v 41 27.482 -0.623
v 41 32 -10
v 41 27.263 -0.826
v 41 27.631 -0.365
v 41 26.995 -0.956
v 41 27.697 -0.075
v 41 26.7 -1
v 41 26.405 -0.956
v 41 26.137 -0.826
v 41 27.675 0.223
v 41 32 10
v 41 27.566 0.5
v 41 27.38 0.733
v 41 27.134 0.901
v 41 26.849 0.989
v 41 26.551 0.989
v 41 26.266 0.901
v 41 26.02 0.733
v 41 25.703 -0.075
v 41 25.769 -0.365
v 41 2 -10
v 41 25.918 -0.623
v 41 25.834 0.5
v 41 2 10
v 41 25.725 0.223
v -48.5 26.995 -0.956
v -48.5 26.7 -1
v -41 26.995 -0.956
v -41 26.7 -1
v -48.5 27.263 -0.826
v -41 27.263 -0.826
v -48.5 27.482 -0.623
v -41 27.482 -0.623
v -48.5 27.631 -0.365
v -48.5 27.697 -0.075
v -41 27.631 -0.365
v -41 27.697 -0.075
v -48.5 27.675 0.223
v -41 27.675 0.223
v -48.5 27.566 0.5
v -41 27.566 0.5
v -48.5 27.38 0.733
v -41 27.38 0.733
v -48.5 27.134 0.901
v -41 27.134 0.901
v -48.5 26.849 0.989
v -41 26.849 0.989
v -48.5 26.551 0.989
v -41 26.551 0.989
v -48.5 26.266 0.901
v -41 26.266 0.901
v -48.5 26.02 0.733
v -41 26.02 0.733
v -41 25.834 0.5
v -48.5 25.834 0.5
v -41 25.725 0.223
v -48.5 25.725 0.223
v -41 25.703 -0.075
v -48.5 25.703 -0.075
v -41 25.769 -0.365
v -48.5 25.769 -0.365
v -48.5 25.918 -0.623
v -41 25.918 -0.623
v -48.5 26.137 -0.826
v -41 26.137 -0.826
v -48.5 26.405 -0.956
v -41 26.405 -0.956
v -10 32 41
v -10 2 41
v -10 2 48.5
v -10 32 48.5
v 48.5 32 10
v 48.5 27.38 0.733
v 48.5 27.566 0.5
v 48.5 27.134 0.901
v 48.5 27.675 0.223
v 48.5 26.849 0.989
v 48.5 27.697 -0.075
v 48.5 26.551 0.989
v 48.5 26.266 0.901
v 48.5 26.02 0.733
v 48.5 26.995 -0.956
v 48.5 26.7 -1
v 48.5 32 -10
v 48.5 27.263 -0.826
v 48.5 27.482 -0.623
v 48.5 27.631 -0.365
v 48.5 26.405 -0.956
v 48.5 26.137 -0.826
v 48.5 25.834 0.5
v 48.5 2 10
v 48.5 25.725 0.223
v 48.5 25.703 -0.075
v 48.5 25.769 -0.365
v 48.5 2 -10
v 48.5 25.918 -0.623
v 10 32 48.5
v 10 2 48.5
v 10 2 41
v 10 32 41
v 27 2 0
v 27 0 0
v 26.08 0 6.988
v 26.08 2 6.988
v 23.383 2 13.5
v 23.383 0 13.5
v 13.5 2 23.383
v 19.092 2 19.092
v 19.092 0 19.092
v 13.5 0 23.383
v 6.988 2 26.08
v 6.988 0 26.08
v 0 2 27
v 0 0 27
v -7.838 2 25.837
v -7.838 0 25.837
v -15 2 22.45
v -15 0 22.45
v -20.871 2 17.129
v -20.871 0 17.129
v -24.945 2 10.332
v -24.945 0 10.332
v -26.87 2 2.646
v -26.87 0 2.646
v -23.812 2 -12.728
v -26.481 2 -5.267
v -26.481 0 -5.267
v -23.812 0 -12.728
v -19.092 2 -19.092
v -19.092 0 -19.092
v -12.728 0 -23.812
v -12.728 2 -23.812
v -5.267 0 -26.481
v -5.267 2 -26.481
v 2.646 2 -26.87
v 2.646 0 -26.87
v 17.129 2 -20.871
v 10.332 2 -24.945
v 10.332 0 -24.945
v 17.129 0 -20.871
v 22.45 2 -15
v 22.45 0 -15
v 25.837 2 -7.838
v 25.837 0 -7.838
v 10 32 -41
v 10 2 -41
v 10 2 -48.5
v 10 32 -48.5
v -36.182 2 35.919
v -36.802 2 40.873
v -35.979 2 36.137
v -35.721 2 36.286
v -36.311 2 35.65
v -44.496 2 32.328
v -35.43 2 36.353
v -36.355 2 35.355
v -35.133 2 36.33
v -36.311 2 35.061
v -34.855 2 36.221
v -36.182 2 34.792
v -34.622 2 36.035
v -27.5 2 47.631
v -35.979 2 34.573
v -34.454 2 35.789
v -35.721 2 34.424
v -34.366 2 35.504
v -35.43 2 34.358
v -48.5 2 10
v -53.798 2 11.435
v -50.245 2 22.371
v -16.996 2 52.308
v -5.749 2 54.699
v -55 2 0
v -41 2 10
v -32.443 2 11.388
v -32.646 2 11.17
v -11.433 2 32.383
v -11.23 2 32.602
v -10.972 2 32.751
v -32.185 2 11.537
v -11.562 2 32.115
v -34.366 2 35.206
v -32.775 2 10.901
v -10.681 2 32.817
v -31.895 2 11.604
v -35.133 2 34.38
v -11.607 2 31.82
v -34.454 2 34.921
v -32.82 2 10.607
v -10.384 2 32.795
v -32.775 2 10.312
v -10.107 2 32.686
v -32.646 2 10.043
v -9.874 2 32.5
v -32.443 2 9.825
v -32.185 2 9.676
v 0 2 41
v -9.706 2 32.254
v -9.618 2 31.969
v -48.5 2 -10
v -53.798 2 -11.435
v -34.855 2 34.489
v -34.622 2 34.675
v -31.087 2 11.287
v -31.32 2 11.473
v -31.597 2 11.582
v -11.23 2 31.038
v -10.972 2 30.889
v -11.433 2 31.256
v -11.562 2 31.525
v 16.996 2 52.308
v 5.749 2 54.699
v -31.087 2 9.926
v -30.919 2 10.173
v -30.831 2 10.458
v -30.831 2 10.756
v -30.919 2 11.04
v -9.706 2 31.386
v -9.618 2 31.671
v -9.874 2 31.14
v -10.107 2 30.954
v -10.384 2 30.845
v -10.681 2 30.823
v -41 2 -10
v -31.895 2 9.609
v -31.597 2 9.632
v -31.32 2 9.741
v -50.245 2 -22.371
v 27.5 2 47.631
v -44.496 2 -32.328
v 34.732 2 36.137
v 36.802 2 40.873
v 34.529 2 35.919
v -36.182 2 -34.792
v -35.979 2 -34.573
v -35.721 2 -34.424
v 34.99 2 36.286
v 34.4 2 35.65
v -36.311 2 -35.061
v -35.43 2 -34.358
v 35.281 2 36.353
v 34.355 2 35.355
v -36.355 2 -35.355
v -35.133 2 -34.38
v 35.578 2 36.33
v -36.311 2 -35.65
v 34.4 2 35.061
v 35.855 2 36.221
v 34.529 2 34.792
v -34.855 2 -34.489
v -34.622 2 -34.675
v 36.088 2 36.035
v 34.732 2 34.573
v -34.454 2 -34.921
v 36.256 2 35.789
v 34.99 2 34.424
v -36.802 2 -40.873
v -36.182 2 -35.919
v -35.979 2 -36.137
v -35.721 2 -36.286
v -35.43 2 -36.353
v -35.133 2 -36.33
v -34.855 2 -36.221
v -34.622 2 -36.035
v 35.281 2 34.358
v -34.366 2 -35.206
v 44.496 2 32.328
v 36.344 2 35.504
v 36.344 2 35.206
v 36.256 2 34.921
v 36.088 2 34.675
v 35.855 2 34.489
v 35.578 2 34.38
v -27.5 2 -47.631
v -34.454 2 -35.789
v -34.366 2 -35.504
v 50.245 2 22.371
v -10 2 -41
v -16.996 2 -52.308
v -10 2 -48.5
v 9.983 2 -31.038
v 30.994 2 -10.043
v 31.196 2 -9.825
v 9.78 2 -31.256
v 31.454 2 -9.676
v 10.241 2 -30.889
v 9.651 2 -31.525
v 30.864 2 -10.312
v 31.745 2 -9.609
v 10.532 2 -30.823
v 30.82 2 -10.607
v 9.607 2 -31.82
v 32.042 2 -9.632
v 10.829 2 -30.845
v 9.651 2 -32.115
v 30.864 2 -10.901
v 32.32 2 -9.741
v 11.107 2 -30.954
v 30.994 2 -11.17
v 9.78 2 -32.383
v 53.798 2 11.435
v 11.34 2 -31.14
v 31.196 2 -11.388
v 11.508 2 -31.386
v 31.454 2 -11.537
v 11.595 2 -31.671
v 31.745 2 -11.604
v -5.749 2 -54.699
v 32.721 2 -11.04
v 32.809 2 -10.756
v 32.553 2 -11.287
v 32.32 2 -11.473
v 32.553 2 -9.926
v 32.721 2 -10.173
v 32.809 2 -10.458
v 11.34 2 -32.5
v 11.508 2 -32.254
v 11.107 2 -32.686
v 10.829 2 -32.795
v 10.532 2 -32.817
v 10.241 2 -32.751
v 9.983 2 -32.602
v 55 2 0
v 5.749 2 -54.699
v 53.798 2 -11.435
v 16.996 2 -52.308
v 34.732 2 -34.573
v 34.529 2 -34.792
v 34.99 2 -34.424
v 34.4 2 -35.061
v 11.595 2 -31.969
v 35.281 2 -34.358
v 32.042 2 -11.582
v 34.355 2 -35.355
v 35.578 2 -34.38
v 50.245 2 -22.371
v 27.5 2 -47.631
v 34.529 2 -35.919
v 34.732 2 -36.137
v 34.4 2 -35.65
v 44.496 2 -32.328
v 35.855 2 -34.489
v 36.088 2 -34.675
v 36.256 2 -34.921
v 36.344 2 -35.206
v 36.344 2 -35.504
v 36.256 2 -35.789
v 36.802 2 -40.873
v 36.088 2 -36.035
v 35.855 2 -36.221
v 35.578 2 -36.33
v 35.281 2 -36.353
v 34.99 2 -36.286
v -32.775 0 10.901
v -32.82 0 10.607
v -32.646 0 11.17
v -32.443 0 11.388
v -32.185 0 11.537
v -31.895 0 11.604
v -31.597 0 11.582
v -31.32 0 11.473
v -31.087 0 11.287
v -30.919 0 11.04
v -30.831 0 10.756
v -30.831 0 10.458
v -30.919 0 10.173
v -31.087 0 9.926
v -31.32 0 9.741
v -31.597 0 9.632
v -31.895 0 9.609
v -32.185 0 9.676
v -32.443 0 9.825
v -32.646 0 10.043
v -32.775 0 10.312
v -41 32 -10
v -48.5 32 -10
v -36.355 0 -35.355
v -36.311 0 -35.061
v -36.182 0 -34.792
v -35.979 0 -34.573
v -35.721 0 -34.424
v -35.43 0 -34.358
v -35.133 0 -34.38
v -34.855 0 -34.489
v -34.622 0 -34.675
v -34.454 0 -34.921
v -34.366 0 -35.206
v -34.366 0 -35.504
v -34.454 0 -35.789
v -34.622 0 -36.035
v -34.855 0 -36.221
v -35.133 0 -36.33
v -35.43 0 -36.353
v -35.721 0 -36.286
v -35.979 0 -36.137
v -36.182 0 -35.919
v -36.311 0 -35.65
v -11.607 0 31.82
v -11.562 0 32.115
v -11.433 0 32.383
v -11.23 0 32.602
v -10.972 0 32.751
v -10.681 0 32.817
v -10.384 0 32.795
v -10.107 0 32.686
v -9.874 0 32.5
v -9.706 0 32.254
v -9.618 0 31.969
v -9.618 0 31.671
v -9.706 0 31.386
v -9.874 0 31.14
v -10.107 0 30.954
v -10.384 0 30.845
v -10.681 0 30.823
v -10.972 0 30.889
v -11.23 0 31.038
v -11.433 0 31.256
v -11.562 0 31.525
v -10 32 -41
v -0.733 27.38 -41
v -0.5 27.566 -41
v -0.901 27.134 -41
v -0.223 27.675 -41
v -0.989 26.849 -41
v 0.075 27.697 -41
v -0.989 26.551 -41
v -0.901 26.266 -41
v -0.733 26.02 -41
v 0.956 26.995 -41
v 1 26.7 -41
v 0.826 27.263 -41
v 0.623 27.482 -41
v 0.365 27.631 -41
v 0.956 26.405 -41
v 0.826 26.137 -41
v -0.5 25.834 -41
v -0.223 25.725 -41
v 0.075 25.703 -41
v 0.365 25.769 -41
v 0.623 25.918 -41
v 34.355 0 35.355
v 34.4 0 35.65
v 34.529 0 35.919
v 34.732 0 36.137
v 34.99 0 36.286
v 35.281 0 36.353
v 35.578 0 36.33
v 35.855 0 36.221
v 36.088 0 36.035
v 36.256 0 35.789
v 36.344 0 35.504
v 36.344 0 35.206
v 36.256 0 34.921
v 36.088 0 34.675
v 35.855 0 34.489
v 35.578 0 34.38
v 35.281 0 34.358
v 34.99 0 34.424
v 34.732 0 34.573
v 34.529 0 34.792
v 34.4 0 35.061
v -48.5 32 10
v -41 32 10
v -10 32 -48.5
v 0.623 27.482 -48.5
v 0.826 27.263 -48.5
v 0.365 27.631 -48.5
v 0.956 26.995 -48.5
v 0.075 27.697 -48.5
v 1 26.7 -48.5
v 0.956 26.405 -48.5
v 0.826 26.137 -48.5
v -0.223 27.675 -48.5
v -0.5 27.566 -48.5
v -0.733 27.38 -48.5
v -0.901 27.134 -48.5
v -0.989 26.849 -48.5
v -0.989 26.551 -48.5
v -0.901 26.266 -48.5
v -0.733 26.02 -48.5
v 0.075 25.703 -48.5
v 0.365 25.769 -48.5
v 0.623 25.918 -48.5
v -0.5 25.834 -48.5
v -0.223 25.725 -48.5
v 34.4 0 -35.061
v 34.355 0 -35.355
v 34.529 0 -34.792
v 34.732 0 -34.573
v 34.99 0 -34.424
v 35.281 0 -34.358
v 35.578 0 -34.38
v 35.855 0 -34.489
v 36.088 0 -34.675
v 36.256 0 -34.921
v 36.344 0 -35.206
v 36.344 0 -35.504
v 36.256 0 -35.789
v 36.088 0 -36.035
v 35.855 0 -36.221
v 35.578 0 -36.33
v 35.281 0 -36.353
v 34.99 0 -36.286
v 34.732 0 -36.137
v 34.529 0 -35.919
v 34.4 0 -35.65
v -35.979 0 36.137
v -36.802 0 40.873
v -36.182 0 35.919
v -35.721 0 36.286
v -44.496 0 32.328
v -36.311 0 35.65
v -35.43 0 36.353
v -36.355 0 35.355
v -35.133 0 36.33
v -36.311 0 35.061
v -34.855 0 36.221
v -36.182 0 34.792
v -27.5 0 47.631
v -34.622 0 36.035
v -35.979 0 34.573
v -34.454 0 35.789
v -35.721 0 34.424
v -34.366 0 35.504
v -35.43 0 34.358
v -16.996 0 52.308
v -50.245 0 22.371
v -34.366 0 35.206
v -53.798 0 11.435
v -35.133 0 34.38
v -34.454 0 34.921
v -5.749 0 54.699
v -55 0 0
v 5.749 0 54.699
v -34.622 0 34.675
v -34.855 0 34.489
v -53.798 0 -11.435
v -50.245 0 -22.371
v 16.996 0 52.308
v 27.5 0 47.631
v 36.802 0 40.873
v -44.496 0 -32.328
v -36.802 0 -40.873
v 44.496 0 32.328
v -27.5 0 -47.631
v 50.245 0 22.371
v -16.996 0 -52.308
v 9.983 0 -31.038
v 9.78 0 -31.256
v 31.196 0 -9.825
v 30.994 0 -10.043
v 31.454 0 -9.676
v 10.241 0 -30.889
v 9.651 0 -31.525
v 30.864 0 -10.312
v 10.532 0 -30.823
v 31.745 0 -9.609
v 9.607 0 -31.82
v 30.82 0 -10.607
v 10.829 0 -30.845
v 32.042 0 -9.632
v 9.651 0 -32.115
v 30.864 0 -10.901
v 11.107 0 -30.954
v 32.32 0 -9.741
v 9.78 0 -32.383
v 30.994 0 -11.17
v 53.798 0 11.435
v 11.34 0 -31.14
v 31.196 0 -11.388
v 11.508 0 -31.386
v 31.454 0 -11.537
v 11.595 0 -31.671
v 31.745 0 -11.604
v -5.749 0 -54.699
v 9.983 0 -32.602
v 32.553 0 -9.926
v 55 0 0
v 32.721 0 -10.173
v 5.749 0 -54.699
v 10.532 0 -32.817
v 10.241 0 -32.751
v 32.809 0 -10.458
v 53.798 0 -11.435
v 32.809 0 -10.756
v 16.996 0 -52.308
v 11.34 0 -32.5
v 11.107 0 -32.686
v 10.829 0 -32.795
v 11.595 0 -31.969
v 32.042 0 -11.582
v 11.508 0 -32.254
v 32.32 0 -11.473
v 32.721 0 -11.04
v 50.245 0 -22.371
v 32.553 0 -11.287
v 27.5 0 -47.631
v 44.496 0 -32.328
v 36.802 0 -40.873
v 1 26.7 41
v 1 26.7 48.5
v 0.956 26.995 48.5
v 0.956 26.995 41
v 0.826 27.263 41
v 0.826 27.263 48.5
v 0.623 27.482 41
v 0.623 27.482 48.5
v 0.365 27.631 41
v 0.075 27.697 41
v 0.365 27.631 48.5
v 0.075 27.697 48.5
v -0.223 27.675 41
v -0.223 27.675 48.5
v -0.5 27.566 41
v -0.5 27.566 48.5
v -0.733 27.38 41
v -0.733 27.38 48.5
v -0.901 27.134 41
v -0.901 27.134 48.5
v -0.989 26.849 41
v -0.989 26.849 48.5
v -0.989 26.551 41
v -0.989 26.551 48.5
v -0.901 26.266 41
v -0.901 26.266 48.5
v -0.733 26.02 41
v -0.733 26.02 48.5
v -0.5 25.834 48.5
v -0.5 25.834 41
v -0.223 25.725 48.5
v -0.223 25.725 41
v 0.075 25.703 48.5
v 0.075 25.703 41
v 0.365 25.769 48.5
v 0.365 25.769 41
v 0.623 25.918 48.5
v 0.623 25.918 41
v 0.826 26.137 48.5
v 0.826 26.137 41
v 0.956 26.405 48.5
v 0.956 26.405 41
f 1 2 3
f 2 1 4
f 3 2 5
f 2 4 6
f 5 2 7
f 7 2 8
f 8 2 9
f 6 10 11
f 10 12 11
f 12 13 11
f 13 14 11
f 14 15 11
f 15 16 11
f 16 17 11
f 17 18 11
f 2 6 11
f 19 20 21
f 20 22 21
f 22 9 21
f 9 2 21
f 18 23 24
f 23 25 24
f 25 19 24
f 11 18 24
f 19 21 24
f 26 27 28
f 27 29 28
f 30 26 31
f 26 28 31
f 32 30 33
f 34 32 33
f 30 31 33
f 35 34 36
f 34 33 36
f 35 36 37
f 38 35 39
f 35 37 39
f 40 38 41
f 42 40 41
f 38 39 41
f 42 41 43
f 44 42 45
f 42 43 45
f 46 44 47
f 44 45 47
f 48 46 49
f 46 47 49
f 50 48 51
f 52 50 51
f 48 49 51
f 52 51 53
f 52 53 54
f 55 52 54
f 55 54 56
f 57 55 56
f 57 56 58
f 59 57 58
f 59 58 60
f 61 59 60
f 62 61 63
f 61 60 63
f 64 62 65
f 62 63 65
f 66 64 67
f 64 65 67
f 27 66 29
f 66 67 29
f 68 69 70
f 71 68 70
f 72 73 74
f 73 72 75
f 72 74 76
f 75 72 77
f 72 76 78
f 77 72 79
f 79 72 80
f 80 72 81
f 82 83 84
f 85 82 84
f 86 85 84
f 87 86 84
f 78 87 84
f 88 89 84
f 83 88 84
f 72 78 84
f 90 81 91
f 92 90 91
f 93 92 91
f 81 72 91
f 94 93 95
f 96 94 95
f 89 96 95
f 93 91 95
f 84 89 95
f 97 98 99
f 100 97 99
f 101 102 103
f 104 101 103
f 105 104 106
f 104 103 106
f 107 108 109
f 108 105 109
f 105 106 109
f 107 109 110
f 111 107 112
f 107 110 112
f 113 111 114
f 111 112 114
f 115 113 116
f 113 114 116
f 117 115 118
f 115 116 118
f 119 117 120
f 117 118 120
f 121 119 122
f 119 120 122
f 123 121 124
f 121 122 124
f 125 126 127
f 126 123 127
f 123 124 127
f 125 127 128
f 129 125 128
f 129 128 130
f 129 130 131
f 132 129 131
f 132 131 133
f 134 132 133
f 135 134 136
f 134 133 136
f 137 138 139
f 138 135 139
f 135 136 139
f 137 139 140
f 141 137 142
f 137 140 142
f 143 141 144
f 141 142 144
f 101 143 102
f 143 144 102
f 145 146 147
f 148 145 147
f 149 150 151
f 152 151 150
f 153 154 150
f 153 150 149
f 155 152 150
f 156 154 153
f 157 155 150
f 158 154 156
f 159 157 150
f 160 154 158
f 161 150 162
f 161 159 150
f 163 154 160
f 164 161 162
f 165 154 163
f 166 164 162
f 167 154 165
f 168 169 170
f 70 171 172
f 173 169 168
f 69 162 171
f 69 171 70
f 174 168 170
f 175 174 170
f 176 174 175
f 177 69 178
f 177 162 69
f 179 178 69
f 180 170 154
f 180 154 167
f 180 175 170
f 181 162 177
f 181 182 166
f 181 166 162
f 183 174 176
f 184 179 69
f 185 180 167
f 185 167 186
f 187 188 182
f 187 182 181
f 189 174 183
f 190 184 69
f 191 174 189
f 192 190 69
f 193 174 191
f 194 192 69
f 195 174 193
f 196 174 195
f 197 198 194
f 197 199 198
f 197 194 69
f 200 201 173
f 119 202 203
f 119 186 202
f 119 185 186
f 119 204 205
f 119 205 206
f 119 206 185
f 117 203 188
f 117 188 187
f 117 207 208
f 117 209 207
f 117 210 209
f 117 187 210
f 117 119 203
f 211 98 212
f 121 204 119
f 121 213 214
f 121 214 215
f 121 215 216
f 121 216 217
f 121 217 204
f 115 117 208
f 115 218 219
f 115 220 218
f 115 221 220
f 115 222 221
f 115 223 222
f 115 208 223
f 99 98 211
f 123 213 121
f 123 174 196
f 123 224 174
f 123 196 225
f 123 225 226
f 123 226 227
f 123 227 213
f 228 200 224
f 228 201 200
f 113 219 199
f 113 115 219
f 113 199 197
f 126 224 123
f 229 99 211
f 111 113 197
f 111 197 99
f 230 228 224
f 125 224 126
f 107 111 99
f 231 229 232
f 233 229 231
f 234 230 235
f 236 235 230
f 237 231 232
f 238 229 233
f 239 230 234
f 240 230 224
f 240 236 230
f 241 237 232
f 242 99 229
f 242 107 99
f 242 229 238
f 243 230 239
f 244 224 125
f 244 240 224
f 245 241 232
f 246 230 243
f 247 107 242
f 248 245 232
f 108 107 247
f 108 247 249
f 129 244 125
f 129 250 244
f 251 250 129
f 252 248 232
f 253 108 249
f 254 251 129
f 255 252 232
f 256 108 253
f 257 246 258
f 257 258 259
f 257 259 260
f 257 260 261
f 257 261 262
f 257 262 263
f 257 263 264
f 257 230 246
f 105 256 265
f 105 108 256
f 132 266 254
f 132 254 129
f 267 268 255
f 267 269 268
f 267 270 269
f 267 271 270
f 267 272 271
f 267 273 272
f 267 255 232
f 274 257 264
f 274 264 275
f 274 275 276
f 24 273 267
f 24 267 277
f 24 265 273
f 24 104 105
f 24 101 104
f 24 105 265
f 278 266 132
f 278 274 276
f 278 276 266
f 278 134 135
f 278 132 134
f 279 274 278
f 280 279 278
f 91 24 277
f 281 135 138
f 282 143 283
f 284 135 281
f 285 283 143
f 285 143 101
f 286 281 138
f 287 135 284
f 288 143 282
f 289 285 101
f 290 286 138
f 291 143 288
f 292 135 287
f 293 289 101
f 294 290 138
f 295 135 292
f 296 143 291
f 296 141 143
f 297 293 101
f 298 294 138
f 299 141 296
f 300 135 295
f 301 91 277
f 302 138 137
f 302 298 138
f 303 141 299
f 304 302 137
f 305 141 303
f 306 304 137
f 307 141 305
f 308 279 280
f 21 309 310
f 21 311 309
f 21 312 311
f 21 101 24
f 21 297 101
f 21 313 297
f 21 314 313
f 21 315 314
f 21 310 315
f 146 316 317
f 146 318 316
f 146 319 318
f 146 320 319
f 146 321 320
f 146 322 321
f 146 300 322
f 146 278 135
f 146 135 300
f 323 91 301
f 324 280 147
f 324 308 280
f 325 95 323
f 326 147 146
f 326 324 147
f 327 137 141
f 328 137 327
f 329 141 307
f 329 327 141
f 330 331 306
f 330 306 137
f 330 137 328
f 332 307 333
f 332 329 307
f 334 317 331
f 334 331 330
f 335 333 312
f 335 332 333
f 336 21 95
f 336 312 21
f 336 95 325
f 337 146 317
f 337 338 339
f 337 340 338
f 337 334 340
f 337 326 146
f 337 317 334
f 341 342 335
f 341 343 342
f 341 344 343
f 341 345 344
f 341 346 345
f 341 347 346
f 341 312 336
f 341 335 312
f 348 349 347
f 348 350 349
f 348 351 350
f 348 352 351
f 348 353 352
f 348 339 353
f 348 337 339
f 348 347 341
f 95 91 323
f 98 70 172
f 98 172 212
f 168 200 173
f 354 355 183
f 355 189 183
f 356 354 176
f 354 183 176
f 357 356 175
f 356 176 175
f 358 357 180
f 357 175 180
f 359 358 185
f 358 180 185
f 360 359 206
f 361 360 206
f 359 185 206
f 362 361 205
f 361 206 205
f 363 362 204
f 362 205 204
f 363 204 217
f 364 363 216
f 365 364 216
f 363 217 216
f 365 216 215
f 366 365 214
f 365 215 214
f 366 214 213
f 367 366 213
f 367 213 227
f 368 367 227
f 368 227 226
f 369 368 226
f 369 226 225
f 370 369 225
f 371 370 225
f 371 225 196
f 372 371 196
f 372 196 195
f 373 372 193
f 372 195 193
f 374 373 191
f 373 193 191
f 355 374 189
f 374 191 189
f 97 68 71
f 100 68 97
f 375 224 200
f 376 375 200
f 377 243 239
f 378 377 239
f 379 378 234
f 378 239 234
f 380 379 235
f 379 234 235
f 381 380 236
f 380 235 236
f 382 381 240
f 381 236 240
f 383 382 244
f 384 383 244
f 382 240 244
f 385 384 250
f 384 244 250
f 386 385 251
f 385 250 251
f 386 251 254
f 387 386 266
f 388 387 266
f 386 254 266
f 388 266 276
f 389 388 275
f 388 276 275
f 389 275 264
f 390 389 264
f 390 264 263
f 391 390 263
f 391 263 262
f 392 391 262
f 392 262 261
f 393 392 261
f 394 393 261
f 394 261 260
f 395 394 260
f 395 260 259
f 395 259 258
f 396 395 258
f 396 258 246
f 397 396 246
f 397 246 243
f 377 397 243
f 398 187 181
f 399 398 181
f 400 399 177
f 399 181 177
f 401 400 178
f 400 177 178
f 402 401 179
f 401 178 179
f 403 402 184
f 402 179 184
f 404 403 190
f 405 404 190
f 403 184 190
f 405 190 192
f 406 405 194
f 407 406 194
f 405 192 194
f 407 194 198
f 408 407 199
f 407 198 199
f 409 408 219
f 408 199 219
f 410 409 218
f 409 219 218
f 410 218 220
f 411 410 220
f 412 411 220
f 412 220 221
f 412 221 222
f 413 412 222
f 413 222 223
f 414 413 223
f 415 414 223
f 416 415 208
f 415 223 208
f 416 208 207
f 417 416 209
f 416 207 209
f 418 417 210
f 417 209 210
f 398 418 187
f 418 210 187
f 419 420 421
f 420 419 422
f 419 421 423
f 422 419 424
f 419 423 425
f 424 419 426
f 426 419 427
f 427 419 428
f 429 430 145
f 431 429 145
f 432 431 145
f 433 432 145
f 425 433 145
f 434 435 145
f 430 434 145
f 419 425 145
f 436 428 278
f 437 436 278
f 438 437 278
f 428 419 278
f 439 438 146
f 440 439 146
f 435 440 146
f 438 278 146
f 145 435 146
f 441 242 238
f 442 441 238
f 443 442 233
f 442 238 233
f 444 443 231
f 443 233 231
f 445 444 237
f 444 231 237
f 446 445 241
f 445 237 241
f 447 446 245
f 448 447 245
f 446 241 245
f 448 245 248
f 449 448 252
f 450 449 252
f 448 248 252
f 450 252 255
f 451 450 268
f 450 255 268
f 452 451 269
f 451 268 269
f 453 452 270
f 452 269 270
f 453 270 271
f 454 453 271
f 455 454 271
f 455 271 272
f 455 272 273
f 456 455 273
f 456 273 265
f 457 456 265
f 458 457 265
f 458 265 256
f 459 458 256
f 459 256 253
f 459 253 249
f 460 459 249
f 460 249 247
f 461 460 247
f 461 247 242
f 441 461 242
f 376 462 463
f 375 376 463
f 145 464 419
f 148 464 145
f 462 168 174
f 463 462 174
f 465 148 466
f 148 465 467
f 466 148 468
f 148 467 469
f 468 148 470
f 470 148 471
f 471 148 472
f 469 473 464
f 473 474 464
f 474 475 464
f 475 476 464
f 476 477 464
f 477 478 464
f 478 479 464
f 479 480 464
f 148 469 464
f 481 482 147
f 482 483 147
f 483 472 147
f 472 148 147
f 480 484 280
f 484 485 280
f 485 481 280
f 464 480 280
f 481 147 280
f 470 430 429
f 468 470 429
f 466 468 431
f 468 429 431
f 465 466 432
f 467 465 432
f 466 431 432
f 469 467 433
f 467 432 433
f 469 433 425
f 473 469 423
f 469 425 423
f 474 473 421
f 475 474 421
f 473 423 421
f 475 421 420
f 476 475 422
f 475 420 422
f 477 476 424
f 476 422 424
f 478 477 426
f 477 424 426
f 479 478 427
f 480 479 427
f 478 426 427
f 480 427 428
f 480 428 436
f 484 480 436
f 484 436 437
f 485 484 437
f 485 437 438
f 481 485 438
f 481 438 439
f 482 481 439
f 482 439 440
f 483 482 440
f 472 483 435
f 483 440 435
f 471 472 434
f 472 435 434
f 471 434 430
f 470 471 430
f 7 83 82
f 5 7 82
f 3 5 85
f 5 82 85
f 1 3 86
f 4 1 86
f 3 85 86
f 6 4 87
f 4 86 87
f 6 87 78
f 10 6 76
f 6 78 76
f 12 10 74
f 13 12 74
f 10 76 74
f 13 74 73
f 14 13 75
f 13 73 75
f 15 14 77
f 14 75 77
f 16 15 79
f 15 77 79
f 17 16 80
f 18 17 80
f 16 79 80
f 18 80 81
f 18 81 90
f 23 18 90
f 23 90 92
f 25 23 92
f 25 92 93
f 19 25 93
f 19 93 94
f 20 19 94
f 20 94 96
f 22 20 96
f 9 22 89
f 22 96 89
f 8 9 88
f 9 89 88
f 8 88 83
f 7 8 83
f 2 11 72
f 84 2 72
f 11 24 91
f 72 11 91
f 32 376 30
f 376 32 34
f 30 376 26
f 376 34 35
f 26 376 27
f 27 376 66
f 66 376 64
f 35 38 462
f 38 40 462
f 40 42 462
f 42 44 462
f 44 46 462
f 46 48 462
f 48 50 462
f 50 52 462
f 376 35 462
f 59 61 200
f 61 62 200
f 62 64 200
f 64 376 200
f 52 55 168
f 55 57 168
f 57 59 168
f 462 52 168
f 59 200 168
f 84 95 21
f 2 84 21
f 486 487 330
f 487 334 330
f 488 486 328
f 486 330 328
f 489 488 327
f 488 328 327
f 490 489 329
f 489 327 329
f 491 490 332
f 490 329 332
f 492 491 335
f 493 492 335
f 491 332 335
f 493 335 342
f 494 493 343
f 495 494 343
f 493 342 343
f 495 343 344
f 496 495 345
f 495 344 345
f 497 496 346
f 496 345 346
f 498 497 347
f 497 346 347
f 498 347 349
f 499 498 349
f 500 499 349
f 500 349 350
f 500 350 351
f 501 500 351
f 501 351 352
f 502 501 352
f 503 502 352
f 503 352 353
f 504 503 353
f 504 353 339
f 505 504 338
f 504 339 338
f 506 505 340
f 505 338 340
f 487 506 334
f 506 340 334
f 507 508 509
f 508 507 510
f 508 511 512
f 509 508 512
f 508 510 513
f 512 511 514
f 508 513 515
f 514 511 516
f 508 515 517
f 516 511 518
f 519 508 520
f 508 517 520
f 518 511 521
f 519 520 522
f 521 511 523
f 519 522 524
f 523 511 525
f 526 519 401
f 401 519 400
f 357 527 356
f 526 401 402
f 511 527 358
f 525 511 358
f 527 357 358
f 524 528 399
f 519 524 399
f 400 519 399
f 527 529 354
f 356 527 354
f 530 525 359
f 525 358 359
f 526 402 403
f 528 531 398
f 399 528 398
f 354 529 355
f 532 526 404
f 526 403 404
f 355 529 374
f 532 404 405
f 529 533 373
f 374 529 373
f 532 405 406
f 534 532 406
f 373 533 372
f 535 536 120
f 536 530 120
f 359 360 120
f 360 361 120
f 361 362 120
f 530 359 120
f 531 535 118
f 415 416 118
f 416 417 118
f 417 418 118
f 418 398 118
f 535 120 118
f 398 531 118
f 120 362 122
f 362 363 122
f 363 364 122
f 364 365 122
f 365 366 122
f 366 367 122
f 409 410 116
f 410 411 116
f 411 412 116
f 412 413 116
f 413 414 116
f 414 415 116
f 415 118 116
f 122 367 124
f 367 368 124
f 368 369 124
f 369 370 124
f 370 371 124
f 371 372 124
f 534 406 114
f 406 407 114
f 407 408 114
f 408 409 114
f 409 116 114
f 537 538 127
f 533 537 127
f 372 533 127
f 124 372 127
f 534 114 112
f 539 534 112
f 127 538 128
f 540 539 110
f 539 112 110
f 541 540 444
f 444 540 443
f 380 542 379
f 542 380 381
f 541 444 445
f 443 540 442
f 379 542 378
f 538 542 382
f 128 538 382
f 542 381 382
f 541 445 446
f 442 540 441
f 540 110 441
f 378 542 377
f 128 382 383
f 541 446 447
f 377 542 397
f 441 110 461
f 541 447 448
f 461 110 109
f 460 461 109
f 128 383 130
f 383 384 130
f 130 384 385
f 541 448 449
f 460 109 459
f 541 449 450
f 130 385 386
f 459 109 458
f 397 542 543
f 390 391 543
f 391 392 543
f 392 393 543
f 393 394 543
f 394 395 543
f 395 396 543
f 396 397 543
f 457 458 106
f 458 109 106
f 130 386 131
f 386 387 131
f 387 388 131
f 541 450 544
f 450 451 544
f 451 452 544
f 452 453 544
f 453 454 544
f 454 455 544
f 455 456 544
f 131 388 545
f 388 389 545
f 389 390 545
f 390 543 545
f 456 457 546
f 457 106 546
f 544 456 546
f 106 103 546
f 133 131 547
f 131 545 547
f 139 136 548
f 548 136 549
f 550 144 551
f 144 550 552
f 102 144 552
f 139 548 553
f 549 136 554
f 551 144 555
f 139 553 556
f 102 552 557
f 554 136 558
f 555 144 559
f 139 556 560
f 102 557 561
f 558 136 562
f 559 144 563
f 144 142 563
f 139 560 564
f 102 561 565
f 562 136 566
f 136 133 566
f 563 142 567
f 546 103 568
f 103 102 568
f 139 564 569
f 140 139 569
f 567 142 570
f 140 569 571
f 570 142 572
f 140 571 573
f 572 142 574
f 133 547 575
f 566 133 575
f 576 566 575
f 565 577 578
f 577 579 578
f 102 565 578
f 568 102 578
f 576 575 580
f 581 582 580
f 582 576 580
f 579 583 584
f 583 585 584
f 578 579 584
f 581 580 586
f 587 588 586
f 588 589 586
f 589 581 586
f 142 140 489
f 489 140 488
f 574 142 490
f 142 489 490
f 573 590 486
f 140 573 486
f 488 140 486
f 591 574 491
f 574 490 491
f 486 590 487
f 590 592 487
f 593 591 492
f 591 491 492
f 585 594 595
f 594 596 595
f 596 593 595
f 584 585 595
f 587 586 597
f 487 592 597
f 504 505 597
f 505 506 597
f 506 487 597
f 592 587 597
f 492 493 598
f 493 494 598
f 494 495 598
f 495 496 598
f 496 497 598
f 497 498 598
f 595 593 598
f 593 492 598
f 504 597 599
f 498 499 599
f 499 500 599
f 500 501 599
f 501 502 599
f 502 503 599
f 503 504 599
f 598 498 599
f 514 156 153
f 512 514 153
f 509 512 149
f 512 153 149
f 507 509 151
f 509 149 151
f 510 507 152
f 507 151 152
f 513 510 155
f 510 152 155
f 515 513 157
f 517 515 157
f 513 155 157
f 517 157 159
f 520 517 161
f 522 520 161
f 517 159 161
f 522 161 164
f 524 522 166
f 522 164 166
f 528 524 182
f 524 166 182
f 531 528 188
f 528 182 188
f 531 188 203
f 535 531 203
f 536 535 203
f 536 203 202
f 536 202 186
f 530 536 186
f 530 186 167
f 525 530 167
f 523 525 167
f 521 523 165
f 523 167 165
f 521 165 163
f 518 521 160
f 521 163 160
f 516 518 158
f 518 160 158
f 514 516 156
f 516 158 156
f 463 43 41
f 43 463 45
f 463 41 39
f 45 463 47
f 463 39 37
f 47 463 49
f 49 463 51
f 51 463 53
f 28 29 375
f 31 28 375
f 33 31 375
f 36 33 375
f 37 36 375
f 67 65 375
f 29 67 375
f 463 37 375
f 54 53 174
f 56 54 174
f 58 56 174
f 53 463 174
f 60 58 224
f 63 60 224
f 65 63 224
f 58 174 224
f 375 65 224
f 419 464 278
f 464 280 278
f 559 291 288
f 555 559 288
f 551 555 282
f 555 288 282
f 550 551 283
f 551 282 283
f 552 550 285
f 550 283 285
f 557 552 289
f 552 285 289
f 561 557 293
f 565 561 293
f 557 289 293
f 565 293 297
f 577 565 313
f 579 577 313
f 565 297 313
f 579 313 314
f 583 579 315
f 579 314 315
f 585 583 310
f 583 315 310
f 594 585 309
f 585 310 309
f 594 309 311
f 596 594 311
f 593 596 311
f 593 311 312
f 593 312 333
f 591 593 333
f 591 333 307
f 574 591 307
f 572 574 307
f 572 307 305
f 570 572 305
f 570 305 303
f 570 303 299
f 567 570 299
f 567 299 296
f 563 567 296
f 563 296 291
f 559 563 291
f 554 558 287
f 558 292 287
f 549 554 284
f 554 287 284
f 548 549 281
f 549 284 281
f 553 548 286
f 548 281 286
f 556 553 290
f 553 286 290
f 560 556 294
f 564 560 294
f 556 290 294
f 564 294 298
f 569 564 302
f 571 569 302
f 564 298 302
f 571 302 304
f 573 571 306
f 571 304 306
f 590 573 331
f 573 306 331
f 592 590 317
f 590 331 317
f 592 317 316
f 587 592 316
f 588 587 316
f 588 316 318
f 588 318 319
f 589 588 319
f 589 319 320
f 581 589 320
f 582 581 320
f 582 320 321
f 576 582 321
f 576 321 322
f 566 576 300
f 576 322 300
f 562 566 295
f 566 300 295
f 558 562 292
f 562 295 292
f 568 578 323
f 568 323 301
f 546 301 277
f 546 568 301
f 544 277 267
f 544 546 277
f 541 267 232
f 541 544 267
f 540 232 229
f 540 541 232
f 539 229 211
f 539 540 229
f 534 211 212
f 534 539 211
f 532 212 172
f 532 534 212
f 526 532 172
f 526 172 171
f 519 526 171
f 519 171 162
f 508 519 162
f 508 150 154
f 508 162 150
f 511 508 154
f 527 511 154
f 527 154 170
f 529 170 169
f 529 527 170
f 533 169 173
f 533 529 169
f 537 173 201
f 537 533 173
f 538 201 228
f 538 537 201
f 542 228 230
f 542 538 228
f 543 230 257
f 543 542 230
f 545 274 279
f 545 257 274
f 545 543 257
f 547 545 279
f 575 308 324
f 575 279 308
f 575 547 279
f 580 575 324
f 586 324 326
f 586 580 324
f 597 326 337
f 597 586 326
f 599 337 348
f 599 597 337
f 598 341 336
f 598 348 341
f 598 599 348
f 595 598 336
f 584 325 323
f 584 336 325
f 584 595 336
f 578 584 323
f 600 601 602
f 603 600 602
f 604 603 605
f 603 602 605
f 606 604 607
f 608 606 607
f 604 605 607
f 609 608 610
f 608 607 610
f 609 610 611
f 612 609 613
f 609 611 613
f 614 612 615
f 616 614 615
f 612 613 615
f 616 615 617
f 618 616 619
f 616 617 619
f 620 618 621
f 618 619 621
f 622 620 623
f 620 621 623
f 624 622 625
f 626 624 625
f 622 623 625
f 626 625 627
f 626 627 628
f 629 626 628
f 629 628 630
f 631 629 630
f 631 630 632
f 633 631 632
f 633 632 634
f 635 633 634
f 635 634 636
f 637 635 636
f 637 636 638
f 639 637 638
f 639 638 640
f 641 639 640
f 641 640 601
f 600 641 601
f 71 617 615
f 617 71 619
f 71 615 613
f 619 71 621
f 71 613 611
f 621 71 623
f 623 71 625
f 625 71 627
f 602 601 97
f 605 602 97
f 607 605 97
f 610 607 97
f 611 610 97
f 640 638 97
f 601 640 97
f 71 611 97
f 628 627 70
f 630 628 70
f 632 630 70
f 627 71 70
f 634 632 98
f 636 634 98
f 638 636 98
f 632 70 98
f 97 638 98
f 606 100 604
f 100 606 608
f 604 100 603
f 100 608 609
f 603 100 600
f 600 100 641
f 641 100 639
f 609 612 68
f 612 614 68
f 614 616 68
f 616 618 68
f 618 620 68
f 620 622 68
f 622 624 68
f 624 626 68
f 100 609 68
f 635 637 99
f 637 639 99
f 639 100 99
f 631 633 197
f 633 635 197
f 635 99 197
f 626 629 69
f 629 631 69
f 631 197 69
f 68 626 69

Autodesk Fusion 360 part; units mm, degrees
sketch "Sketch1" plane through (0, 0, 0) normal (0, 1, 0) x (1, 0, 0)
  circle A0 centre (0, 0) radius 27
  circle A1 centre (0, 0) radius 55
  line L0 (10, -41) -> (-10, -41)
  line L1 (-10, -41) -> (-10, -48.5)
  line L2 (-10, -48.5) -> (10, -48.5)
  line L3 (10, -48.5) -> (10, -41)
  line L4 (10, -41) -> (-10, -48.5) construction
  line L5 (-10, -41) -> (10, -48.5) construction
  line L6 (41, 10) -> (48.5, -10) construction
  line L7 (41, 10) -> (41, -10)
  line L8 (48.5, -10) -> (48.5, 10)
  line L9 (48.5, 10) -> (41, 10)
  line L10 (41, -10) -> (48.5, 10) construction
  line L11 (41, -10) -> (48.5, -10)
  line L12 (-10, 41) -> (10, 48.5) construction
  line L13 (-10, 41) -> (10, 41)
  line L14 (10, 48.5) -> (-10, 48.5)
  line L15 (-10, 48.5) -> (-10, 41)
  line L16 (10, 41) -> (-10, 48.5) construction
  line L17 (10, 41) -> (10, 48.5)
  line L18 (-41, -10) -> (-48.5, 10) construction
  line L19 (-41, -10) -> (-41, 10)
  line L20 (-48.5, 10) -> (-48.5, -10)
  line L21 (-48.5, -10) -> (-41, -10)
  line L22 (-41, 10) -> (-48.5, -10) construction
  line L23 (-41, 10) -> (-48.5, 10)
  line L24 (0, 0) -> (0, -44.75)
  line L25 (0, 0) -> (27, 0)
  point P0 (0, -44.75)
  point P1 (44.75, 0)
  point P2 (0, 44.75)
  point P3 (-44.75, 0)
  dimension "d1" = 54
  dimension "d2" = 110
  dimension "d7" = 7.5
  dimension "d8" = 20
  dimension "d9" = 41
  dimension "d11" = 360
extrude "Extrude3" add sketch "Sketch1" along normal blind 2 contours L0 L1 L2 L3 | A1 | L7 L8 L9 L11 | L13 L14 L15 L17 | L19 L20 L21 L23
extrude "Extrude5" add sketch "Sketch1" along normal blind 32 contours L0 L1 L2 L3 | L7 L8 L9 L11 | L13 L14 L15 L17 | L19 L20 L21 L23
sketch "Sketch6" plane through (0, 2, 0) normal (0, 1, 0) x (-1, 0, 0)
  line L0 (-10, 48.5) -> (10, 48.5)
  line L1 (10, 48.5) -> (10, 41)
  line L2 (10, 41) -> (-10, 41)
  line L3 (-10, 41) -> (-10, 48.5)
  line L4 (41, -10) -> (41, 10)
  line L5 (41, 10) -> (48.5, 10)
  line L6 (48.5, 10) -> (48.5, -10)
  line L7 (48.5, -10) -> (41, -10)
  line L8 (-41, 10) -> (-41, -10)
  line L9 (-41, -10) -> (-48.5, -10)
  line L10 (-48.5, -10) -> (-48.5, 10)
  line L11 (-48.5, 10) -> (-41, 10)
  line L12 (-10, -41) -> (10, -41)
  line L13 (10, -41) -> (10, -48.5)
  line L14 (10, -48.5) -> (-10, -48.5)
  line L15 (-10, -48.5) -> (-10, -41)
  circle A0 centre (0, 0) radius 27
  circle A1 centre (0, 0) radius 55
  line L16 (29.6985, 15.5563) -> (26.8701, 12.7279)
  line L17 (12.7279, 26.8701) -> (15.5563, 29.6985)
  line L18 (18.1297, 22.7228) -> (20.9915, 22.7228) construction
  line L19 (15.3614, 25.1762) -> (18.4198, 25.1762) construction
  line L20 (17.8019, 25.9553) -> (17.4822, 25.9553) construction
  line L21 (29.6985, 15.5563) -> (26.8701, 12.7279)
  line L22 (26.8701, 12.7279) -> (22.6274, 16.9706)
  line L23 (22.6274, 16.9706) -> (25.4558, 19.799)
  line L24 (25.4558, 19.799) -> (29.6985, 15.5563)
  line L25 (15.5563, 29.6985) -> (12.7279, 26.8701)
  line L26 (12.7279, 26.8701) -> (16.9706, 22.6274)
  line L27 (16.9706, 22.6274) -> (19.799, 25.4558)
  line L28 (19.799, 25.4558) -> (15.5563, 29.6985)
  line L29 (22.6274, 16.9706) -> (16.9706, 22.6274)
  line L30 (0, 0) -> (27, 0)
  line L31 (0, 0) -> (19.799, 19.799)
  line L32 (-15.3614, -25.1762) -> (-18.4198, -25.1762) construction
  line L33 (-22.6274, -16.9706) -> (-25.4558, -19.799)
  line L34 (-12.7279, -26.8701) -> (-15.5563, -29.6985)
  line L35 (-26.8701, -12.7279) -> (-22.6274, -16.9706)
  line L36 (-12.7279, -26.8701) -> (-16.9706, -22.6274)
  line L37 (-25.4558, -19.799) -> (-29.6985, -15.5563)
  line L38 (-29.6985, -15.5563) -> (-26.8701, -12.7279)
  line L39 (-18.1297, -22.7228) -> (-20.9915, -22.7228) construction
  line L40 (-29.6985, -15.5563) -> (-26.8701, -12.7279)
  line L41 (-19.799, -25.4558) -> (-15.5563, -29.6985)
  line L42 (-16.9706, -22.6274) -> (-19.799, -25.4558)
  line L43 (-22.6274, -16.9706) -> (-16.9706, -22.6274)
  line L44 (-15.5563, -29.6985) -> (-12.7279, -26.8701)
  line L45 (-17.8019, -25.9553) -> (-17.4822, -25.9553) construction
  circle A2 centre (35.3553, -35.3553) radius 1
  line L46 (35.3553, -35.3553) -> (0, 0)
  circle A3 centre (35.3553, 35.3553) radius 1
  circle A4 centre (-35.3553, 35.3553) radius 1
  circle A5 centre (-35.3553, -35.3553) radius 1
  circle A6 centre (31.8198, 10.6066) radius 1
  line L47 (28.2843, 14.1421) -> (31.8198, 10.6066)
  line L48 (19.799, 19.799) -> (22.225, 22.225)
  circle A7 centre (10.6066, 31.8198) radius 1
  circle A8 centre (-31.8198, -10.6066) radius 1
  circle A9 centre (-10.6066, -31.8198) radius 1
  point P0 (19.799, 19.799)
  point P1 (-19.799, -19.799)
  point P2 (-19.799, -19.799)
  dimension "d37" = 4
  dimension "d38" = 20
  dimension "d43" = 6
  dimension "d44" = 6
  dimension "d45" = 4
  dimension "d46" = 45
  dimension "d48" = 360
  dimension "d61" = 2
  dimension "d62" = 45
  dimension "d63" = 50
  dimension "d65" = 360
  dimension "d68" = 2
  dimension "d69" = 5
  dimension "d71" = 360
  dimension "d74" = 16
  dimension "d75" = 28
extrude "Extrude12" cut sketch "Sketch6" against normal blind 30 contours A6 | A7 | A8 | A9
extrude "Extrude11" cut sketch "Sketch6" against normal blind 10 contours A2 | A3 | A4 | A5
sketch "Sketch8" plane through (0, 0, 48.5) normal (0, 0, 1) x (1, 0, 0)
  line L0 (-10, 2) -> (10, 2)
  line L1 (10, 2) -> (10, 32)
  line L2 (10, 32) -> (-10, 32)
  line L3 (-10, 32) -> (-10, 2)
  circle A0 centre (0, 26.7) radius 1
  dimension "d51" = 2
  dimension "d52" = 10
  dimension "d53" = 24.7
extrude "Extrude9" cut sketch "Sketch8" against normal blind 100 contours A0
sketch "Sketch9" plane through (48.5, 0, 0) normal (1, 0, 0) x (0, 0, -1)
  line L0 (-10, 2) -> (10, 2)
  line L1 (10, 2) -> (10, 32)
  line L2 (10, 32) -> (-10, 32)
  line L3 (-10, 32) -> (-10, 2)
  circle A0 centre (0, 26.7) radius 1
  dimension "d56" = 2
  dimension "d57" = 10
  dimension "d58" = 24.7
extrude "Extrude10" cut sketch "Sketch9" against normal blind 100 contours A0
sketch "Sketch10" plane through (0, 2, 0) normal (0, 1, 0) x (-1, 0, 0)
  circle A0 centre (35.3553, 35.3553) radius 1
  circle A1 centre (-35.3553, 35.3553) radius 1
  circle A2 centre (35.3553, -35.3553) radius 1
  circle A3 centre (-35.3553, -35.3553) radius 1
  circle A4 centre (-31.8198, -10.6066) radius 1
  circle A5 centre (31.8198, 10.6066) radius 1
  circle A6 centre (-10.6066, -31.8198) radius 1
  circle A7 centre (10.6066, 31.8198) radius 1
  line L0 (-10, 48.5) -> (10, 48.5)
  line L1 (10, 48.5) -> (10, 41)
  line L2 (10, 41) -> (-10, 41)
  line L3 (-10, 41) -> (-10, 48.5)
  line L4 (41, -10) -> (41, 10)
  line L5 (41, 10) -> (48.5, 10)
  line L6 (48.5, 10) -> (48.5, -10)
  line L7 (48.5, -10) -> (41, -10)
  line L8 (-41, 10) -> (-41, -10)
  line L9 (-41, -10) -> (-48.5, -10)
  line L10 (-48.5, -10) -> (-48.5, 10)
  line L11 (-48.5, 10) -> (-41, 10)
  line L12 (-10, -41) -> (10, -41)
  line L13 (10, -41) -> (10, -48.5)
  line L14 (10, -48.5) -> (-10, -48.5)
  line L15 (-10, -48.5) -> (-10, -41)
  circle A8 centre (0, 0) radius 27
  circle A9 centre (0, 0) radius 55
